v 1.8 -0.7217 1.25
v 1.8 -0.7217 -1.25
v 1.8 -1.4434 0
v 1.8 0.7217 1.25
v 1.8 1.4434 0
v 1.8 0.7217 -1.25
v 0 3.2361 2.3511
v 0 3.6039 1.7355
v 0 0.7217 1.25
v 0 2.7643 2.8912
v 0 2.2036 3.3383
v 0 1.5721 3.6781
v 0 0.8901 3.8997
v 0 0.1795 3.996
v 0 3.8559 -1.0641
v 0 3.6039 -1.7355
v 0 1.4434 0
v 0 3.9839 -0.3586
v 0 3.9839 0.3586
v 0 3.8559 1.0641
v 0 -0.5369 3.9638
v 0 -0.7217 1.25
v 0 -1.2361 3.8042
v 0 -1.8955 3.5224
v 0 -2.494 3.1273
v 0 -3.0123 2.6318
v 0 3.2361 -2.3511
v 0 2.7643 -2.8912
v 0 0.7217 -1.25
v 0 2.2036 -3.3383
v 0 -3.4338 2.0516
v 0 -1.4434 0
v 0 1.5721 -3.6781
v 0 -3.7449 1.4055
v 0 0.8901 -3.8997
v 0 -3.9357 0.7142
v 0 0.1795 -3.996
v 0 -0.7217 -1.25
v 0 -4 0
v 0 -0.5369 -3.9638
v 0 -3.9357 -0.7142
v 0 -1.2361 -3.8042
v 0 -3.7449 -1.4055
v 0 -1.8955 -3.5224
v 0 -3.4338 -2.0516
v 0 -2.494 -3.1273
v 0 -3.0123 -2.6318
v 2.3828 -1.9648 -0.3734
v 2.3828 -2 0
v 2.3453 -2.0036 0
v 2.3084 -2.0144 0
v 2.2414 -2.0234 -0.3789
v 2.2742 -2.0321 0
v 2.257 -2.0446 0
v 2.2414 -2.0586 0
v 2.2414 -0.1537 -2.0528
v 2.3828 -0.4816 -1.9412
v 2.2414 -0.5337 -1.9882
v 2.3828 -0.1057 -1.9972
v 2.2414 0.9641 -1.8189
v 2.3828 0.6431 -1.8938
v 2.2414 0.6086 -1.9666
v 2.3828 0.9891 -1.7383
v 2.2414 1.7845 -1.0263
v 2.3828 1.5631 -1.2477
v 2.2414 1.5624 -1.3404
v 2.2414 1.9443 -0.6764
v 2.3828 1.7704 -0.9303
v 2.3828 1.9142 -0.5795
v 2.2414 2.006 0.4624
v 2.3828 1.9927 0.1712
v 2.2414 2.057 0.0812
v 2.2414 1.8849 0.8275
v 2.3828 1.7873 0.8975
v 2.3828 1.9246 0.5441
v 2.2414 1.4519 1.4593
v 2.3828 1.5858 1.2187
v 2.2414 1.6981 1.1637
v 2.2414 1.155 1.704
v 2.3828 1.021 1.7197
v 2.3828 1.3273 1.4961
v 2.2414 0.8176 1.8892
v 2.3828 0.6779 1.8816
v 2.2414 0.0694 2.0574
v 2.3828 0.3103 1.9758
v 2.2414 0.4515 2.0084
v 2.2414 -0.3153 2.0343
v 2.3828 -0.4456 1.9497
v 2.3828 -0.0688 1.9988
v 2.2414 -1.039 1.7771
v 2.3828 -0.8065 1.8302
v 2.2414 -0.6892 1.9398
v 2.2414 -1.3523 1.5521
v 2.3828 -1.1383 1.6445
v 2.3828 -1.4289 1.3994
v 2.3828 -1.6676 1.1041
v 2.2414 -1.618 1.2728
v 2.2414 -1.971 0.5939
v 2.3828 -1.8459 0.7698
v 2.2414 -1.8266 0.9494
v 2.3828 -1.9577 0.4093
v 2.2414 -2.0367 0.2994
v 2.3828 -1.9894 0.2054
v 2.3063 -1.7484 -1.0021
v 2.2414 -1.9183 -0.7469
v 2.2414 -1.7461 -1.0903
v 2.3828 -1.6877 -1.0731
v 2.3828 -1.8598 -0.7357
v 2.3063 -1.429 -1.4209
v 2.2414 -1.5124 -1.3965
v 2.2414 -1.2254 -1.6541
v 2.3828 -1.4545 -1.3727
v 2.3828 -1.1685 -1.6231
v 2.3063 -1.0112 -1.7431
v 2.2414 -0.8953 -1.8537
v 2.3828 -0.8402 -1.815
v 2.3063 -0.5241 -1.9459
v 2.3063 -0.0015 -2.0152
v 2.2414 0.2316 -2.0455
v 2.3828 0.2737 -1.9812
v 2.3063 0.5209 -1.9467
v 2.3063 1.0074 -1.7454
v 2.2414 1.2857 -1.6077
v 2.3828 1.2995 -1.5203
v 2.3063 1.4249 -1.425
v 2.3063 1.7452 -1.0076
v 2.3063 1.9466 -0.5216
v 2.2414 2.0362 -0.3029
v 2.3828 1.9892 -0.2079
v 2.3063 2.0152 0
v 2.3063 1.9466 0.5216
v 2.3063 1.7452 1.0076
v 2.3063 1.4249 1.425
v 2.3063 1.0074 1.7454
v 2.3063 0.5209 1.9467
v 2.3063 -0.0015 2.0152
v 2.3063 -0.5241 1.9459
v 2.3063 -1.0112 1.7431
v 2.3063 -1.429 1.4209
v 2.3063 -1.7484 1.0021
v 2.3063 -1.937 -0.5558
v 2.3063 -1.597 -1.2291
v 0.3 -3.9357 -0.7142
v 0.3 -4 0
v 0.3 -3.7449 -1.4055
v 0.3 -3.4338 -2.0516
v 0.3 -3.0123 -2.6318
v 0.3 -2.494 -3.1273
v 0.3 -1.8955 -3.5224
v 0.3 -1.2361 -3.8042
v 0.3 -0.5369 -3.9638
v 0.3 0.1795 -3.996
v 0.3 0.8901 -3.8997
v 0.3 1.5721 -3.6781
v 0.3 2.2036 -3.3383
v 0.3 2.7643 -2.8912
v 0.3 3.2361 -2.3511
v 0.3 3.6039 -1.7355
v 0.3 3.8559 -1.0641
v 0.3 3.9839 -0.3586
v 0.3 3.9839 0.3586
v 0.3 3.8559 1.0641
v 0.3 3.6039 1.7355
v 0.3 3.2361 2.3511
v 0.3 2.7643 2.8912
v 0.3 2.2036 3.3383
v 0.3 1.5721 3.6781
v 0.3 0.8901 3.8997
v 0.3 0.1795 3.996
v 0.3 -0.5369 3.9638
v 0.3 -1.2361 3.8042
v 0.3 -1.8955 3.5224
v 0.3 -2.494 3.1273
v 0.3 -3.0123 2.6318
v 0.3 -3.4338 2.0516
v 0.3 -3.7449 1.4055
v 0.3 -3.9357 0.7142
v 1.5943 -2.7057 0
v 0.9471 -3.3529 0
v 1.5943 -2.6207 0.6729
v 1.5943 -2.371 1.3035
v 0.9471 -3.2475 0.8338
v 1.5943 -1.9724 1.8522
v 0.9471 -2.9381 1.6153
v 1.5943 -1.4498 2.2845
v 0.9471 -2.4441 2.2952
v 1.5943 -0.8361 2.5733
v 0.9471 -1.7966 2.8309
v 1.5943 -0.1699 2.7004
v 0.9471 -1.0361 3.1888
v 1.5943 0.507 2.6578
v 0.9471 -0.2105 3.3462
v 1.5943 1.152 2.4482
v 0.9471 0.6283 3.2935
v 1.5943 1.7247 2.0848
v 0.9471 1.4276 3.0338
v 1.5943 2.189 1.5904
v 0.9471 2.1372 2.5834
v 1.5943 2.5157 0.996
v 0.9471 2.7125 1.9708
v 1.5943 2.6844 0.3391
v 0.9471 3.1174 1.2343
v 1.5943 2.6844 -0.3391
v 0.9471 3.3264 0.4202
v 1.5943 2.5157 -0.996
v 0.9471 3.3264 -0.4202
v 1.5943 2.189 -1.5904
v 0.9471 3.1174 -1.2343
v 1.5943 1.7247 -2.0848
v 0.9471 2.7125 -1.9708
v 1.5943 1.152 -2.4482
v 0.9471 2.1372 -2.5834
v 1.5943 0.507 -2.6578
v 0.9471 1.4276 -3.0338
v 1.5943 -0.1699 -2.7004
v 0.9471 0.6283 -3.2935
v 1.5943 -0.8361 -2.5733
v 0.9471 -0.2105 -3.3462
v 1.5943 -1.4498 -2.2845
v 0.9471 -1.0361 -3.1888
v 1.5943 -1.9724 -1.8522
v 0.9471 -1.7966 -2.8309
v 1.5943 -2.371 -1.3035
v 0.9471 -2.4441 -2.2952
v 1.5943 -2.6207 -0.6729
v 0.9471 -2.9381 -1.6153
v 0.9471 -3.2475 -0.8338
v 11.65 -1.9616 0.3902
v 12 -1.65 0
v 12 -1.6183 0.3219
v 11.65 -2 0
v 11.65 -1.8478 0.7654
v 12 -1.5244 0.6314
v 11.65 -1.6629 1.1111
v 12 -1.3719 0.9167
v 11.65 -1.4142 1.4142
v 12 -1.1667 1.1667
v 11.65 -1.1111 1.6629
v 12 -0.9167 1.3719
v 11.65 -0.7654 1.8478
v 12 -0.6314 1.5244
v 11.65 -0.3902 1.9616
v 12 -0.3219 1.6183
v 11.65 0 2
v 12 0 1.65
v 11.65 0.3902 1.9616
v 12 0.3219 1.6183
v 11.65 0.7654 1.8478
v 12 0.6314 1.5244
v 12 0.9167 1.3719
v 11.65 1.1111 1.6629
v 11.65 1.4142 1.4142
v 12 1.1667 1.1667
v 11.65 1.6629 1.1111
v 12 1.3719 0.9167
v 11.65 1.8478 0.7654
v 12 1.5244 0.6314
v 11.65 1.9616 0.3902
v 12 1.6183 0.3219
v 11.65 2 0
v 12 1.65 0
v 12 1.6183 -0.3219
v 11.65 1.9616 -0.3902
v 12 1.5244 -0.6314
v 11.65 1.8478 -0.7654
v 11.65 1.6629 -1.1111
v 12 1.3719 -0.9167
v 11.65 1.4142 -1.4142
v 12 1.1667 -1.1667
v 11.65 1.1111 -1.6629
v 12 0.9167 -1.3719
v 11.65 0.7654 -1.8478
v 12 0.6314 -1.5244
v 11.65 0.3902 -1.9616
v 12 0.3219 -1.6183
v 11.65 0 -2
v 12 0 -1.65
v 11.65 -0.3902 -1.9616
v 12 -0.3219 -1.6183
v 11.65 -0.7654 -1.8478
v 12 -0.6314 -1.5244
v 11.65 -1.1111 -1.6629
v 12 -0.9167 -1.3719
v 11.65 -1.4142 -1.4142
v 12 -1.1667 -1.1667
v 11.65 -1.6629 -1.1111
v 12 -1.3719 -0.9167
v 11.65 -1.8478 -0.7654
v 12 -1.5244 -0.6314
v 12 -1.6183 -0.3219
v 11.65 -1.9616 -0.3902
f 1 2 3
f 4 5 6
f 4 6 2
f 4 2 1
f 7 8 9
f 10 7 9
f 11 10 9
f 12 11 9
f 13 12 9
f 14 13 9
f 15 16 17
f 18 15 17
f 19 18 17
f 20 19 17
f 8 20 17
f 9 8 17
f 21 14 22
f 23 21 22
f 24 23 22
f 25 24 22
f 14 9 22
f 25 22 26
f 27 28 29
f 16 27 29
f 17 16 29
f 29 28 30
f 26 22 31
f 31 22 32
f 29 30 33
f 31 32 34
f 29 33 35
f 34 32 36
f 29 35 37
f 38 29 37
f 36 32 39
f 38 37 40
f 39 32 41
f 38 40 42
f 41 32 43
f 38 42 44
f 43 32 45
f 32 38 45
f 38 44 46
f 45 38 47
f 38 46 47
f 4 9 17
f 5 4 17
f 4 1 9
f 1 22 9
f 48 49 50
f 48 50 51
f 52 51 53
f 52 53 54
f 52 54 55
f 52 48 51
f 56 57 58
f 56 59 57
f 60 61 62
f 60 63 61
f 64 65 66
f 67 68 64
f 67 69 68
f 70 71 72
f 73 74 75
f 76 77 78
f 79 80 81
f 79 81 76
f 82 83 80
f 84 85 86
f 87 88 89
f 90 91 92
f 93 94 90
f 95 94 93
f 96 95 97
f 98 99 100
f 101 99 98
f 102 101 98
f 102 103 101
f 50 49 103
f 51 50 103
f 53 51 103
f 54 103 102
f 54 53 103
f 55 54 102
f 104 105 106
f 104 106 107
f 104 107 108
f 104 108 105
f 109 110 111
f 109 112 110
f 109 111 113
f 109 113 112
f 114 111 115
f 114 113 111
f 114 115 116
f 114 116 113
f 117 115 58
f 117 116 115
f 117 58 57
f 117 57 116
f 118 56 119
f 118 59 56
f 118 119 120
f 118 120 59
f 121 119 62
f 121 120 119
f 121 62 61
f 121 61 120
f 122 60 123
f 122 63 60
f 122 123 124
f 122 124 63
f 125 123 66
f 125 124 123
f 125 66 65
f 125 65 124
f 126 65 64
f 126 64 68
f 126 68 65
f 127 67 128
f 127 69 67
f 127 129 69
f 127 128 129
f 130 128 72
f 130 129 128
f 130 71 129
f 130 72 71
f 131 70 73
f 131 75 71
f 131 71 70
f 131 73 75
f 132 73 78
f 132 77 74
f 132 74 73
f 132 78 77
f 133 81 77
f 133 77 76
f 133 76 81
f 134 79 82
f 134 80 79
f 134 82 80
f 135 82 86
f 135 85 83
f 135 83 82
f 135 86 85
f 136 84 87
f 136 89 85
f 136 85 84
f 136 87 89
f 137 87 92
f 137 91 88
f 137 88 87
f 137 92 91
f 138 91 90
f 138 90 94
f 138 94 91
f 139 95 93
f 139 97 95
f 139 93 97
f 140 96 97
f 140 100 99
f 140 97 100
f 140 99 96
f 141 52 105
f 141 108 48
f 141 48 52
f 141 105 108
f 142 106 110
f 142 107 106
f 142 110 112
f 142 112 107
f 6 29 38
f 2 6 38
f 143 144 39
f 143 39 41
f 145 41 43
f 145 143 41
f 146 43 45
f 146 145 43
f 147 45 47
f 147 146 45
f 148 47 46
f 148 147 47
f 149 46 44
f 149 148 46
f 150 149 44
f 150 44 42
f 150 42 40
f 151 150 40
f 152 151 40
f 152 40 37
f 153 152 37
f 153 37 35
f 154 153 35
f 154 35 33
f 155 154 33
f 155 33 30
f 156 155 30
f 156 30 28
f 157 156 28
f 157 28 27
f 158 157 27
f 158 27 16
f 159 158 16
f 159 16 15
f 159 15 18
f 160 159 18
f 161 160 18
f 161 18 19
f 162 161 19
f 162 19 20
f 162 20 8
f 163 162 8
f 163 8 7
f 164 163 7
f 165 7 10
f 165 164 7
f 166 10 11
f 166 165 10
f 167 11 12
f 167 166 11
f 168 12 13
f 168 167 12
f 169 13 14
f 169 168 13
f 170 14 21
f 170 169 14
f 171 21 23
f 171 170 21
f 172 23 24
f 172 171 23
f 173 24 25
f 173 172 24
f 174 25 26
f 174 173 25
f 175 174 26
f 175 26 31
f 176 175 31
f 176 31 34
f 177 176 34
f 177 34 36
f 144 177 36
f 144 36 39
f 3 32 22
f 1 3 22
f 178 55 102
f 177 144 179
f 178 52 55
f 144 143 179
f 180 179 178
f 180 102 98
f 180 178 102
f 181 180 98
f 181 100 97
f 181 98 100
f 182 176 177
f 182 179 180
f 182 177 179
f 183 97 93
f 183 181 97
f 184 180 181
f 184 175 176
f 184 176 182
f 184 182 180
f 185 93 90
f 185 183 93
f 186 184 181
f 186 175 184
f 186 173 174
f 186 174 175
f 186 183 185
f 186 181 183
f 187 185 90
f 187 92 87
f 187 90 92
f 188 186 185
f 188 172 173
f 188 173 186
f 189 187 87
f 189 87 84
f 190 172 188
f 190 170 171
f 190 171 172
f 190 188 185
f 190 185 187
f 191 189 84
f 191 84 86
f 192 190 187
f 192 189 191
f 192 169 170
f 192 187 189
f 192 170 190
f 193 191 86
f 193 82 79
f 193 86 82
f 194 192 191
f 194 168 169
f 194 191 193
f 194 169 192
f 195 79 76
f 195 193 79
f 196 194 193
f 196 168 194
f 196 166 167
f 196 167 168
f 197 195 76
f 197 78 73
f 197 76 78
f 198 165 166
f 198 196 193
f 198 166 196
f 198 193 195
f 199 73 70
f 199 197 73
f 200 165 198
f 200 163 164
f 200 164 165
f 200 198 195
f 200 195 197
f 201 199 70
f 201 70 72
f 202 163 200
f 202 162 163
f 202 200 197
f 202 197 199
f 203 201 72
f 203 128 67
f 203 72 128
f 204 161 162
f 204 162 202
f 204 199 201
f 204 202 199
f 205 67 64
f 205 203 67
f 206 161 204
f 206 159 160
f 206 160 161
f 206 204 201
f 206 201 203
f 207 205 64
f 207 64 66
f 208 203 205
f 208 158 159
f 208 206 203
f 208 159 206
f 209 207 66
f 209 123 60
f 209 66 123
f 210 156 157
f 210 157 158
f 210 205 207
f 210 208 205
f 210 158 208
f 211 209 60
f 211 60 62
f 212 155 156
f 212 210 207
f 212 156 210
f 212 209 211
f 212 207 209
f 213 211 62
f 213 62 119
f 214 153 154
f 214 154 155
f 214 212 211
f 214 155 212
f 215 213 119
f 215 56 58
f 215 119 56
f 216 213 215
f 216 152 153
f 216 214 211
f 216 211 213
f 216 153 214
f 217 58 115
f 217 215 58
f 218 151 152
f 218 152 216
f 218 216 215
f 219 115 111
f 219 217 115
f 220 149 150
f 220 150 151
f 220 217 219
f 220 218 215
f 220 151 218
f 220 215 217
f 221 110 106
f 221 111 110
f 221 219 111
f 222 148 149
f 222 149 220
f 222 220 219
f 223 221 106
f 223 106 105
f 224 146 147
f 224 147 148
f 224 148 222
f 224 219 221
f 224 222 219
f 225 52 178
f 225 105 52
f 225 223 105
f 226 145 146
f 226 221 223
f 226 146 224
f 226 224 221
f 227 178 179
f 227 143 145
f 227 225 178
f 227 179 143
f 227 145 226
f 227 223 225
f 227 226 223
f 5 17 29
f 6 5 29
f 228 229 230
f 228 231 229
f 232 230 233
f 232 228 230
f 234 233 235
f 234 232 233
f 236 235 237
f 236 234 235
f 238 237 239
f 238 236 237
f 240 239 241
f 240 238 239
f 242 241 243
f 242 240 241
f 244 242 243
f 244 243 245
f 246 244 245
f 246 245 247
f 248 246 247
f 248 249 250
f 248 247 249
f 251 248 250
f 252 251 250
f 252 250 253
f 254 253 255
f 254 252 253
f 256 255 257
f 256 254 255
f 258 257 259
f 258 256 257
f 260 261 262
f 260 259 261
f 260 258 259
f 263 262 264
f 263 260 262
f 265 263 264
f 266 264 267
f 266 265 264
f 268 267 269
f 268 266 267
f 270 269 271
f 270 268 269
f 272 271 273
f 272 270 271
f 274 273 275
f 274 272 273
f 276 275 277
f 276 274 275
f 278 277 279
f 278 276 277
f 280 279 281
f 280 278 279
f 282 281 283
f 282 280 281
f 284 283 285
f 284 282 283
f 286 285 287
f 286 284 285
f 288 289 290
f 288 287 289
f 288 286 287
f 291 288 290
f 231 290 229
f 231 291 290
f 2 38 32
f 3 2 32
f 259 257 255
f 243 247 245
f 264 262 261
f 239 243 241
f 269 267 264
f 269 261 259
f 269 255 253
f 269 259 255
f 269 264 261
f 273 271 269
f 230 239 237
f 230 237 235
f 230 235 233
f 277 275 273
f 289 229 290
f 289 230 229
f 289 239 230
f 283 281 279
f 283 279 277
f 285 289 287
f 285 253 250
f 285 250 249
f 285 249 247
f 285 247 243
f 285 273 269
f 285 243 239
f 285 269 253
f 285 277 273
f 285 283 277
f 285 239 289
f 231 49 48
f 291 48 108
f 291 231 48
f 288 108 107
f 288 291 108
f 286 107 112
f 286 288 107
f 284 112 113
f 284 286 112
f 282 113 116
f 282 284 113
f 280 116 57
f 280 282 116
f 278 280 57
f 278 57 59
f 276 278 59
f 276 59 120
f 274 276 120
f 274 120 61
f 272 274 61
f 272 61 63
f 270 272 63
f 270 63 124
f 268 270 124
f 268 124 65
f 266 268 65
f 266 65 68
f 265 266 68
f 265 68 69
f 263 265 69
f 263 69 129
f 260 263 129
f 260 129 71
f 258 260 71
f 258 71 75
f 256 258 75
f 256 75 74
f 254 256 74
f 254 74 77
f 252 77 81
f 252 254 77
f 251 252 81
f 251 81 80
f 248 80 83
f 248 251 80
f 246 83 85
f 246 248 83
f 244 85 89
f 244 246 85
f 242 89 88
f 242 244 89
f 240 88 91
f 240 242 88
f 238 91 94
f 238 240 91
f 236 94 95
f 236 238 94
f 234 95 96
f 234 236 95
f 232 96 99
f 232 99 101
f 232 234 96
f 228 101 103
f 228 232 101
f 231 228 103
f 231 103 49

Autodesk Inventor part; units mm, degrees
ref_plane "YZ Plane" through (0, 0, 0) normal (1, 0, 0) x (0, 1, 0)
sketch "Skizze1" plane through (0, 0, 0) normal (0, 1, 0) x (-1, 0, 0)
  point P0 (0, 0)
sketch "Skizze2" plane through (0, 0, 0) normal (0, 0, 1) x (-1, 0, 0)
  line L0 (-12, 2) -> (-12, 0)
  line L1 (-2.3, 2) -> (-12, 2)
  line L2 (-0.3, 4) -> (-2.3, 2)
  line L3 (0, 4) -> (-0.3, 4)
  line L4 (0, 0) -> (0, 4)
  line L5 (-12, 0) -> (0, 0)
  line L6 (-12, 0) -> (0, 0)
  line L7 (0, -9.6) -> (0, 1.6) projected
  line L8 (2.4, 0) -> (-14.4, 0) projected
  dimension "ParC" = 0.3
  dimension "d43" = 45
  dimension "d44" = 4
  dimension "d45" = 2
  dimension "d46" = 12
  dimension "d47" = 0
  dimension "d48" = 0
revolve "Drehung1" add sketch "Skizze2" angle 360 about axis through (12, 0, 0) along (1, 0, 0)
sketch "Skizze3" plane through (0, 0, 0) normal (-1, 0, 0) x (0, 0, 1)
  line L0 (-1.25, 0.7217) -> (-1.25, -0.7217)
  line L1 (0, 1.4434) -> (-1.25, 0.7217)
  line L2 (1.25, 0.7217) -> (0, 1.4434)
  line L3 (1.25, -0.7217) -> (1.25, 0.7217)
  line L4 (0, -1.4434) -> (1.25, -0.7217)
  line L5 (-1.25, -0.7217) -> (0, -1.4434)
  circle A0 centre (0, 0) radius 1.25 construction
  circle A1 centre (0, 0) radius 2 construction
  dimension "d11" = 2.5
  dimension "d13" = 120
  dimension "d15" = 120
extrude "Extrusion1" cut sketch "Skizze3" against normal blind 1.8
fillet "Rundung1" radius 0.2 1 edges at (2.3, 2, 0)
chamfer "Fase1" distance 0.35 angle 45 1 edges at (12, 2, 0) measured on face at (8.7943, 0.9288, -1.7713)
thread "Gewinde1" size "M4x0.7" class "6g" standard "ISO Metric profile" length 8.3
ref_plane "MSC_PF1" through (0, 0, 0) normal (1, 0, 0) x (0, 1, 0)
ref_plane "MSC_PT1" through (0, 0, 0) normal (1, 0, 0) x (0, 1, 0)
equation "\"d43\" = 0.5 * ang"
equation "\"d44\" = 0.5 * dk"
equation "\"d45\" = 0.5 * NND"
equation "\"d46\" = NLG"
equation "\"d11\" = ParS"
equation "\"d16\" = ParT"
equation "\"d18\" = r"
equation "\"d19\" = 0.5 * PTC"
equation "\"d39\" = 0.5 * PTC"
equation "\"NND\" = 4"
equation "\"PTC\" = 0.7"
equation "\"dk\" = 8"
equation "\"ParK\" = 2.3"
equation "\"ParS\" = 2.5"
equation "\"ParT\" = 1.8"
equation "\"r\" = 0.2"
equation "\"NLG\" = 12"
equation "\"ang\" = 90deg"
equation "\"THREADDIA\" = NND"
properties part number "ISO 10642 - M4 x  12" material "Stahl"
